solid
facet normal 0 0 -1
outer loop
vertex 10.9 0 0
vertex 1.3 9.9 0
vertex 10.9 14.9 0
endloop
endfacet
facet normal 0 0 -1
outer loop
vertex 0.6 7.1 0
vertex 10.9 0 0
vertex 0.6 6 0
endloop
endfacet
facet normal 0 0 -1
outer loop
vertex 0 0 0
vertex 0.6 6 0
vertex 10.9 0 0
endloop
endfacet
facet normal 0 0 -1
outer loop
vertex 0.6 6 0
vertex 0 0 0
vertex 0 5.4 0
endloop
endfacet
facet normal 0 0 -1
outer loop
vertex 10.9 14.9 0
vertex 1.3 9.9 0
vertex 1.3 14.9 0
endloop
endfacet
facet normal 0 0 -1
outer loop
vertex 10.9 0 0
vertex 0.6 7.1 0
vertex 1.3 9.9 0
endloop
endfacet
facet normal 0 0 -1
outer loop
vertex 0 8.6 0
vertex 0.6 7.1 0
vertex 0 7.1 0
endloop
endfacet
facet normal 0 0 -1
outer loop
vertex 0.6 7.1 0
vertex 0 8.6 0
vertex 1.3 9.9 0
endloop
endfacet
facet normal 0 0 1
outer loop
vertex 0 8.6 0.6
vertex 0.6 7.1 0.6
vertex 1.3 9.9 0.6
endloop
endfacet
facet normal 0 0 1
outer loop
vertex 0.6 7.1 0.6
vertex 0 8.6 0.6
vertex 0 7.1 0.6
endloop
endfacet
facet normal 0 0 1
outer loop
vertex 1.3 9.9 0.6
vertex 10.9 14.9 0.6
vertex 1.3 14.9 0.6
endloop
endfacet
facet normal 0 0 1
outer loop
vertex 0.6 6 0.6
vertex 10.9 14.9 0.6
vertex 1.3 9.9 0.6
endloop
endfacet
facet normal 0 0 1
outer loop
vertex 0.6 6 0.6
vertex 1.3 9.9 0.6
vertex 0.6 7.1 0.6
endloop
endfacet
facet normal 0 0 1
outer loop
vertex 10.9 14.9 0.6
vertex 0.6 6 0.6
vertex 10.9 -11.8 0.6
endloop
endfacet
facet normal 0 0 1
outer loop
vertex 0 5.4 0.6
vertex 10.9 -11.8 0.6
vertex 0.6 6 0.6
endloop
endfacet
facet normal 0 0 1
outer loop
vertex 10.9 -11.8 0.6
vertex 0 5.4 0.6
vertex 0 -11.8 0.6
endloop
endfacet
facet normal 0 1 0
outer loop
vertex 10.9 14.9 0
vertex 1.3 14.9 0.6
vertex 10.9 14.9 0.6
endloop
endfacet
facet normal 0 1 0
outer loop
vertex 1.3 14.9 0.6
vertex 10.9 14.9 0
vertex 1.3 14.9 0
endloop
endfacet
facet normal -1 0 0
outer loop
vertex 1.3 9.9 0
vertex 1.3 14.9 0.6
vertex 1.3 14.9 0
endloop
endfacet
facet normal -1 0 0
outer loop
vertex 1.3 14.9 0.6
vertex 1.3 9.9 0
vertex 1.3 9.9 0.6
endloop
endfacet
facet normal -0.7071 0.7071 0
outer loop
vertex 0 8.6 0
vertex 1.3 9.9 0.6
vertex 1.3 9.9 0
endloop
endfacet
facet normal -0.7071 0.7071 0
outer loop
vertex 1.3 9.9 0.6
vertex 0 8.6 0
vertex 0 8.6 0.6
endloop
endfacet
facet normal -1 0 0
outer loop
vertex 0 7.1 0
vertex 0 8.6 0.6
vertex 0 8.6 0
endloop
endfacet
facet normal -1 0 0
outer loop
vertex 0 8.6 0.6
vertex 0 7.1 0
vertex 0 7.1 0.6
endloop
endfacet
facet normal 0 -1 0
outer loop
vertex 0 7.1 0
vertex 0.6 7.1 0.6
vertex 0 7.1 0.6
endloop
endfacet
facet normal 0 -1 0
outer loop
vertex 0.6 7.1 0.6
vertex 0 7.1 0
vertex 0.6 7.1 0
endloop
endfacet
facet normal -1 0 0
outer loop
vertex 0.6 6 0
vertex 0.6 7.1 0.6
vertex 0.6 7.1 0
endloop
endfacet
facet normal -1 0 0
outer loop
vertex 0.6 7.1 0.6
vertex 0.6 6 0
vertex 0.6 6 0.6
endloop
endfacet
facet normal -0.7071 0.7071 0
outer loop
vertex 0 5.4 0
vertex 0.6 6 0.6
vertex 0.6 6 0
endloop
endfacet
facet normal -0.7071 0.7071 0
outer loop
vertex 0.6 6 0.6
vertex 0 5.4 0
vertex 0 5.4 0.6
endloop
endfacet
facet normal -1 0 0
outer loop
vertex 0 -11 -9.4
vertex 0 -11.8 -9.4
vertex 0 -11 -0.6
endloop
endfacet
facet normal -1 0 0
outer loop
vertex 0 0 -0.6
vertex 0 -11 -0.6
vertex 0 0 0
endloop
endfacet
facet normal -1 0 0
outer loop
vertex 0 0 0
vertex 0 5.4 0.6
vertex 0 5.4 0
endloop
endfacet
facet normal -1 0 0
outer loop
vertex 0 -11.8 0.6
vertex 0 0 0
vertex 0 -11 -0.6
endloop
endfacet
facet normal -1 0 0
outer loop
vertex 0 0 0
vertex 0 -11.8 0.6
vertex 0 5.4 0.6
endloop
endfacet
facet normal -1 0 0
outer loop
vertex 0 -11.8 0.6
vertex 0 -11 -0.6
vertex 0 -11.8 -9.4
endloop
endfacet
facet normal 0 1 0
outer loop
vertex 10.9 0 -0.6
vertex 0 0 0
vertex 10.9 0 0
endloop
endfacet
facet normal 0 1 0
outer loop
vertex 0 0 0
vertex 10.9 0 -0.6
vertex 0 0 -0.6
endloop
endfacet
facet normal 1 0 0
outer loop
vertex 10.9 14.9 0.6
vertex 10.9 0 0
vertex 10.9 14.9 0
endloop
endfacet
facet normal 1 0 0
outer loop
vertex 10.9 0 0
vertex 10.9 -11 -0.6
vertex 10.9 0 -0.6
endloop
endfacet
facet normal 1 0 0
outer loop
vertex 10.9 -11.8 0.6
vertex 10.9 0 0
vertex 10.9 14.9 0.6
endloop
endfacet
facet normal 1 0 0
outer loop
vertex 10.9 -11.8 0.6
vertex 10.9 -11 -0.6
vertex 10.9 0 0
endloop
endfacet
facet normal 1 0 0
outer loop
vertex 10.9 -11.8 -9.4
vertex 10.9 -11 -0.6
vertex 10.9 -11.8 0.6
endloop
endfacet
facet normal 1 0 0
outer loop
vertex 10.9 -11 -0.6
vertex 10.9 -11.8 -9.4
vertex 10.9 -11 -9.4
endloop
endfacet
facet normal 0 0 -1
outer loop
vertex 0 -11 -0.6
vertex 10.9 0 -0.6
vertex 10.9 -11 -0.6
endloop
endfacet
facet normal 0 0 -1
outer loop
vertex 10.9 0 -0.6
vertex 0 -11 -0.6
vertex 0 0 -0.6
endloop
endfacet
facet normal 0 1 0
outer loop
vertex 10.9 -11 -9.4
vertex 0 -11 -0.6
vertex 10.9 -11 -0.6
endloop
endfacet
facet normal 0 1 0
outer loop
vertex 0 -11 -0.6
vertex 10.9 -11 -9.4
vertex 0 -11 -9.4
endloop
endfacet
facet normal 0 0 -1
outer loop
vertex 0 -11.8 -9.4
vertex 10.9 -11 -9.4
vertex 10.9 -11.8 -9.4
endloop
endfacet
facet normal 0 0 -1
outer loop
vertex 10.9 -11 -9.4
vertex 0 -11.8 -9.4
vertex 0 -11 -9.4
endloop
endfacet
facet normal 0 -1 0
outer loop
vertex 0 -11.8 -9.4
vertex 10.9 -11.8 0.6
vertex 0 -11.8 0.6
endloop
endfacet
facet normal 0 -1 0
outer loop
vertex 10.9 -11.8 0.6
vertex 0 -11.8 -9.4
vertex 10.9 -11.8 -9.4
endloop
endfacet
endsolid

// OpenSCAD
// data taken from
// https://www.sparkfun.com/datasheets/Prototyping/microSD_Spec.pdf
// total card width

A = 10.9;
A1 = 9.6;

A8 = 0.6;

B = 14.9;

B1 = 6.3;

B10 = 7.8;

B11 = 1.1;

C1 = 0.6;

A_ = A - A1;

B_ = B - B1 + A_;

linear_extrude(height = C1) {

    polygon(points = [
        [ 0, 0 ],
        [ A, 0 ],
        [ A, B ],
        [ A_, B ],
        [ A_, B_ ],
        [ 0, B - B1 ],
        [ 0, B - B10 ],
        [ A8, B - B10 ],
        [ A8, B - B10 - B11 ],
        [ 0, B - B10 - B11 - A8 ] ]);

};


width = 10.9;
height = 0.6;

extensionSize = 11;

translate(v = [0, 0, -height]) {
    linear_extrude(height = height*2) {

        polygon(points = [
            [ 0, 0 ],
            [ 0, -extensionSize],
            [ width, -extensionSize],
            [ width, 0]
        ]);

    };
};

extensionHeight = 10;
extensionThickness = 0.8;

translate(v = [0, 0, -extensionHeight+height]) {
    linear_extrude(height = extensionHeight) {

        polygon(points = [
            [ 0, -extensionSize ],
            [ 0, -extensionSize - extensionThickness],
            [ width, -extensionSize - extensionThickness],
            [ width, -extensionSize]
        ]);

    }
}
